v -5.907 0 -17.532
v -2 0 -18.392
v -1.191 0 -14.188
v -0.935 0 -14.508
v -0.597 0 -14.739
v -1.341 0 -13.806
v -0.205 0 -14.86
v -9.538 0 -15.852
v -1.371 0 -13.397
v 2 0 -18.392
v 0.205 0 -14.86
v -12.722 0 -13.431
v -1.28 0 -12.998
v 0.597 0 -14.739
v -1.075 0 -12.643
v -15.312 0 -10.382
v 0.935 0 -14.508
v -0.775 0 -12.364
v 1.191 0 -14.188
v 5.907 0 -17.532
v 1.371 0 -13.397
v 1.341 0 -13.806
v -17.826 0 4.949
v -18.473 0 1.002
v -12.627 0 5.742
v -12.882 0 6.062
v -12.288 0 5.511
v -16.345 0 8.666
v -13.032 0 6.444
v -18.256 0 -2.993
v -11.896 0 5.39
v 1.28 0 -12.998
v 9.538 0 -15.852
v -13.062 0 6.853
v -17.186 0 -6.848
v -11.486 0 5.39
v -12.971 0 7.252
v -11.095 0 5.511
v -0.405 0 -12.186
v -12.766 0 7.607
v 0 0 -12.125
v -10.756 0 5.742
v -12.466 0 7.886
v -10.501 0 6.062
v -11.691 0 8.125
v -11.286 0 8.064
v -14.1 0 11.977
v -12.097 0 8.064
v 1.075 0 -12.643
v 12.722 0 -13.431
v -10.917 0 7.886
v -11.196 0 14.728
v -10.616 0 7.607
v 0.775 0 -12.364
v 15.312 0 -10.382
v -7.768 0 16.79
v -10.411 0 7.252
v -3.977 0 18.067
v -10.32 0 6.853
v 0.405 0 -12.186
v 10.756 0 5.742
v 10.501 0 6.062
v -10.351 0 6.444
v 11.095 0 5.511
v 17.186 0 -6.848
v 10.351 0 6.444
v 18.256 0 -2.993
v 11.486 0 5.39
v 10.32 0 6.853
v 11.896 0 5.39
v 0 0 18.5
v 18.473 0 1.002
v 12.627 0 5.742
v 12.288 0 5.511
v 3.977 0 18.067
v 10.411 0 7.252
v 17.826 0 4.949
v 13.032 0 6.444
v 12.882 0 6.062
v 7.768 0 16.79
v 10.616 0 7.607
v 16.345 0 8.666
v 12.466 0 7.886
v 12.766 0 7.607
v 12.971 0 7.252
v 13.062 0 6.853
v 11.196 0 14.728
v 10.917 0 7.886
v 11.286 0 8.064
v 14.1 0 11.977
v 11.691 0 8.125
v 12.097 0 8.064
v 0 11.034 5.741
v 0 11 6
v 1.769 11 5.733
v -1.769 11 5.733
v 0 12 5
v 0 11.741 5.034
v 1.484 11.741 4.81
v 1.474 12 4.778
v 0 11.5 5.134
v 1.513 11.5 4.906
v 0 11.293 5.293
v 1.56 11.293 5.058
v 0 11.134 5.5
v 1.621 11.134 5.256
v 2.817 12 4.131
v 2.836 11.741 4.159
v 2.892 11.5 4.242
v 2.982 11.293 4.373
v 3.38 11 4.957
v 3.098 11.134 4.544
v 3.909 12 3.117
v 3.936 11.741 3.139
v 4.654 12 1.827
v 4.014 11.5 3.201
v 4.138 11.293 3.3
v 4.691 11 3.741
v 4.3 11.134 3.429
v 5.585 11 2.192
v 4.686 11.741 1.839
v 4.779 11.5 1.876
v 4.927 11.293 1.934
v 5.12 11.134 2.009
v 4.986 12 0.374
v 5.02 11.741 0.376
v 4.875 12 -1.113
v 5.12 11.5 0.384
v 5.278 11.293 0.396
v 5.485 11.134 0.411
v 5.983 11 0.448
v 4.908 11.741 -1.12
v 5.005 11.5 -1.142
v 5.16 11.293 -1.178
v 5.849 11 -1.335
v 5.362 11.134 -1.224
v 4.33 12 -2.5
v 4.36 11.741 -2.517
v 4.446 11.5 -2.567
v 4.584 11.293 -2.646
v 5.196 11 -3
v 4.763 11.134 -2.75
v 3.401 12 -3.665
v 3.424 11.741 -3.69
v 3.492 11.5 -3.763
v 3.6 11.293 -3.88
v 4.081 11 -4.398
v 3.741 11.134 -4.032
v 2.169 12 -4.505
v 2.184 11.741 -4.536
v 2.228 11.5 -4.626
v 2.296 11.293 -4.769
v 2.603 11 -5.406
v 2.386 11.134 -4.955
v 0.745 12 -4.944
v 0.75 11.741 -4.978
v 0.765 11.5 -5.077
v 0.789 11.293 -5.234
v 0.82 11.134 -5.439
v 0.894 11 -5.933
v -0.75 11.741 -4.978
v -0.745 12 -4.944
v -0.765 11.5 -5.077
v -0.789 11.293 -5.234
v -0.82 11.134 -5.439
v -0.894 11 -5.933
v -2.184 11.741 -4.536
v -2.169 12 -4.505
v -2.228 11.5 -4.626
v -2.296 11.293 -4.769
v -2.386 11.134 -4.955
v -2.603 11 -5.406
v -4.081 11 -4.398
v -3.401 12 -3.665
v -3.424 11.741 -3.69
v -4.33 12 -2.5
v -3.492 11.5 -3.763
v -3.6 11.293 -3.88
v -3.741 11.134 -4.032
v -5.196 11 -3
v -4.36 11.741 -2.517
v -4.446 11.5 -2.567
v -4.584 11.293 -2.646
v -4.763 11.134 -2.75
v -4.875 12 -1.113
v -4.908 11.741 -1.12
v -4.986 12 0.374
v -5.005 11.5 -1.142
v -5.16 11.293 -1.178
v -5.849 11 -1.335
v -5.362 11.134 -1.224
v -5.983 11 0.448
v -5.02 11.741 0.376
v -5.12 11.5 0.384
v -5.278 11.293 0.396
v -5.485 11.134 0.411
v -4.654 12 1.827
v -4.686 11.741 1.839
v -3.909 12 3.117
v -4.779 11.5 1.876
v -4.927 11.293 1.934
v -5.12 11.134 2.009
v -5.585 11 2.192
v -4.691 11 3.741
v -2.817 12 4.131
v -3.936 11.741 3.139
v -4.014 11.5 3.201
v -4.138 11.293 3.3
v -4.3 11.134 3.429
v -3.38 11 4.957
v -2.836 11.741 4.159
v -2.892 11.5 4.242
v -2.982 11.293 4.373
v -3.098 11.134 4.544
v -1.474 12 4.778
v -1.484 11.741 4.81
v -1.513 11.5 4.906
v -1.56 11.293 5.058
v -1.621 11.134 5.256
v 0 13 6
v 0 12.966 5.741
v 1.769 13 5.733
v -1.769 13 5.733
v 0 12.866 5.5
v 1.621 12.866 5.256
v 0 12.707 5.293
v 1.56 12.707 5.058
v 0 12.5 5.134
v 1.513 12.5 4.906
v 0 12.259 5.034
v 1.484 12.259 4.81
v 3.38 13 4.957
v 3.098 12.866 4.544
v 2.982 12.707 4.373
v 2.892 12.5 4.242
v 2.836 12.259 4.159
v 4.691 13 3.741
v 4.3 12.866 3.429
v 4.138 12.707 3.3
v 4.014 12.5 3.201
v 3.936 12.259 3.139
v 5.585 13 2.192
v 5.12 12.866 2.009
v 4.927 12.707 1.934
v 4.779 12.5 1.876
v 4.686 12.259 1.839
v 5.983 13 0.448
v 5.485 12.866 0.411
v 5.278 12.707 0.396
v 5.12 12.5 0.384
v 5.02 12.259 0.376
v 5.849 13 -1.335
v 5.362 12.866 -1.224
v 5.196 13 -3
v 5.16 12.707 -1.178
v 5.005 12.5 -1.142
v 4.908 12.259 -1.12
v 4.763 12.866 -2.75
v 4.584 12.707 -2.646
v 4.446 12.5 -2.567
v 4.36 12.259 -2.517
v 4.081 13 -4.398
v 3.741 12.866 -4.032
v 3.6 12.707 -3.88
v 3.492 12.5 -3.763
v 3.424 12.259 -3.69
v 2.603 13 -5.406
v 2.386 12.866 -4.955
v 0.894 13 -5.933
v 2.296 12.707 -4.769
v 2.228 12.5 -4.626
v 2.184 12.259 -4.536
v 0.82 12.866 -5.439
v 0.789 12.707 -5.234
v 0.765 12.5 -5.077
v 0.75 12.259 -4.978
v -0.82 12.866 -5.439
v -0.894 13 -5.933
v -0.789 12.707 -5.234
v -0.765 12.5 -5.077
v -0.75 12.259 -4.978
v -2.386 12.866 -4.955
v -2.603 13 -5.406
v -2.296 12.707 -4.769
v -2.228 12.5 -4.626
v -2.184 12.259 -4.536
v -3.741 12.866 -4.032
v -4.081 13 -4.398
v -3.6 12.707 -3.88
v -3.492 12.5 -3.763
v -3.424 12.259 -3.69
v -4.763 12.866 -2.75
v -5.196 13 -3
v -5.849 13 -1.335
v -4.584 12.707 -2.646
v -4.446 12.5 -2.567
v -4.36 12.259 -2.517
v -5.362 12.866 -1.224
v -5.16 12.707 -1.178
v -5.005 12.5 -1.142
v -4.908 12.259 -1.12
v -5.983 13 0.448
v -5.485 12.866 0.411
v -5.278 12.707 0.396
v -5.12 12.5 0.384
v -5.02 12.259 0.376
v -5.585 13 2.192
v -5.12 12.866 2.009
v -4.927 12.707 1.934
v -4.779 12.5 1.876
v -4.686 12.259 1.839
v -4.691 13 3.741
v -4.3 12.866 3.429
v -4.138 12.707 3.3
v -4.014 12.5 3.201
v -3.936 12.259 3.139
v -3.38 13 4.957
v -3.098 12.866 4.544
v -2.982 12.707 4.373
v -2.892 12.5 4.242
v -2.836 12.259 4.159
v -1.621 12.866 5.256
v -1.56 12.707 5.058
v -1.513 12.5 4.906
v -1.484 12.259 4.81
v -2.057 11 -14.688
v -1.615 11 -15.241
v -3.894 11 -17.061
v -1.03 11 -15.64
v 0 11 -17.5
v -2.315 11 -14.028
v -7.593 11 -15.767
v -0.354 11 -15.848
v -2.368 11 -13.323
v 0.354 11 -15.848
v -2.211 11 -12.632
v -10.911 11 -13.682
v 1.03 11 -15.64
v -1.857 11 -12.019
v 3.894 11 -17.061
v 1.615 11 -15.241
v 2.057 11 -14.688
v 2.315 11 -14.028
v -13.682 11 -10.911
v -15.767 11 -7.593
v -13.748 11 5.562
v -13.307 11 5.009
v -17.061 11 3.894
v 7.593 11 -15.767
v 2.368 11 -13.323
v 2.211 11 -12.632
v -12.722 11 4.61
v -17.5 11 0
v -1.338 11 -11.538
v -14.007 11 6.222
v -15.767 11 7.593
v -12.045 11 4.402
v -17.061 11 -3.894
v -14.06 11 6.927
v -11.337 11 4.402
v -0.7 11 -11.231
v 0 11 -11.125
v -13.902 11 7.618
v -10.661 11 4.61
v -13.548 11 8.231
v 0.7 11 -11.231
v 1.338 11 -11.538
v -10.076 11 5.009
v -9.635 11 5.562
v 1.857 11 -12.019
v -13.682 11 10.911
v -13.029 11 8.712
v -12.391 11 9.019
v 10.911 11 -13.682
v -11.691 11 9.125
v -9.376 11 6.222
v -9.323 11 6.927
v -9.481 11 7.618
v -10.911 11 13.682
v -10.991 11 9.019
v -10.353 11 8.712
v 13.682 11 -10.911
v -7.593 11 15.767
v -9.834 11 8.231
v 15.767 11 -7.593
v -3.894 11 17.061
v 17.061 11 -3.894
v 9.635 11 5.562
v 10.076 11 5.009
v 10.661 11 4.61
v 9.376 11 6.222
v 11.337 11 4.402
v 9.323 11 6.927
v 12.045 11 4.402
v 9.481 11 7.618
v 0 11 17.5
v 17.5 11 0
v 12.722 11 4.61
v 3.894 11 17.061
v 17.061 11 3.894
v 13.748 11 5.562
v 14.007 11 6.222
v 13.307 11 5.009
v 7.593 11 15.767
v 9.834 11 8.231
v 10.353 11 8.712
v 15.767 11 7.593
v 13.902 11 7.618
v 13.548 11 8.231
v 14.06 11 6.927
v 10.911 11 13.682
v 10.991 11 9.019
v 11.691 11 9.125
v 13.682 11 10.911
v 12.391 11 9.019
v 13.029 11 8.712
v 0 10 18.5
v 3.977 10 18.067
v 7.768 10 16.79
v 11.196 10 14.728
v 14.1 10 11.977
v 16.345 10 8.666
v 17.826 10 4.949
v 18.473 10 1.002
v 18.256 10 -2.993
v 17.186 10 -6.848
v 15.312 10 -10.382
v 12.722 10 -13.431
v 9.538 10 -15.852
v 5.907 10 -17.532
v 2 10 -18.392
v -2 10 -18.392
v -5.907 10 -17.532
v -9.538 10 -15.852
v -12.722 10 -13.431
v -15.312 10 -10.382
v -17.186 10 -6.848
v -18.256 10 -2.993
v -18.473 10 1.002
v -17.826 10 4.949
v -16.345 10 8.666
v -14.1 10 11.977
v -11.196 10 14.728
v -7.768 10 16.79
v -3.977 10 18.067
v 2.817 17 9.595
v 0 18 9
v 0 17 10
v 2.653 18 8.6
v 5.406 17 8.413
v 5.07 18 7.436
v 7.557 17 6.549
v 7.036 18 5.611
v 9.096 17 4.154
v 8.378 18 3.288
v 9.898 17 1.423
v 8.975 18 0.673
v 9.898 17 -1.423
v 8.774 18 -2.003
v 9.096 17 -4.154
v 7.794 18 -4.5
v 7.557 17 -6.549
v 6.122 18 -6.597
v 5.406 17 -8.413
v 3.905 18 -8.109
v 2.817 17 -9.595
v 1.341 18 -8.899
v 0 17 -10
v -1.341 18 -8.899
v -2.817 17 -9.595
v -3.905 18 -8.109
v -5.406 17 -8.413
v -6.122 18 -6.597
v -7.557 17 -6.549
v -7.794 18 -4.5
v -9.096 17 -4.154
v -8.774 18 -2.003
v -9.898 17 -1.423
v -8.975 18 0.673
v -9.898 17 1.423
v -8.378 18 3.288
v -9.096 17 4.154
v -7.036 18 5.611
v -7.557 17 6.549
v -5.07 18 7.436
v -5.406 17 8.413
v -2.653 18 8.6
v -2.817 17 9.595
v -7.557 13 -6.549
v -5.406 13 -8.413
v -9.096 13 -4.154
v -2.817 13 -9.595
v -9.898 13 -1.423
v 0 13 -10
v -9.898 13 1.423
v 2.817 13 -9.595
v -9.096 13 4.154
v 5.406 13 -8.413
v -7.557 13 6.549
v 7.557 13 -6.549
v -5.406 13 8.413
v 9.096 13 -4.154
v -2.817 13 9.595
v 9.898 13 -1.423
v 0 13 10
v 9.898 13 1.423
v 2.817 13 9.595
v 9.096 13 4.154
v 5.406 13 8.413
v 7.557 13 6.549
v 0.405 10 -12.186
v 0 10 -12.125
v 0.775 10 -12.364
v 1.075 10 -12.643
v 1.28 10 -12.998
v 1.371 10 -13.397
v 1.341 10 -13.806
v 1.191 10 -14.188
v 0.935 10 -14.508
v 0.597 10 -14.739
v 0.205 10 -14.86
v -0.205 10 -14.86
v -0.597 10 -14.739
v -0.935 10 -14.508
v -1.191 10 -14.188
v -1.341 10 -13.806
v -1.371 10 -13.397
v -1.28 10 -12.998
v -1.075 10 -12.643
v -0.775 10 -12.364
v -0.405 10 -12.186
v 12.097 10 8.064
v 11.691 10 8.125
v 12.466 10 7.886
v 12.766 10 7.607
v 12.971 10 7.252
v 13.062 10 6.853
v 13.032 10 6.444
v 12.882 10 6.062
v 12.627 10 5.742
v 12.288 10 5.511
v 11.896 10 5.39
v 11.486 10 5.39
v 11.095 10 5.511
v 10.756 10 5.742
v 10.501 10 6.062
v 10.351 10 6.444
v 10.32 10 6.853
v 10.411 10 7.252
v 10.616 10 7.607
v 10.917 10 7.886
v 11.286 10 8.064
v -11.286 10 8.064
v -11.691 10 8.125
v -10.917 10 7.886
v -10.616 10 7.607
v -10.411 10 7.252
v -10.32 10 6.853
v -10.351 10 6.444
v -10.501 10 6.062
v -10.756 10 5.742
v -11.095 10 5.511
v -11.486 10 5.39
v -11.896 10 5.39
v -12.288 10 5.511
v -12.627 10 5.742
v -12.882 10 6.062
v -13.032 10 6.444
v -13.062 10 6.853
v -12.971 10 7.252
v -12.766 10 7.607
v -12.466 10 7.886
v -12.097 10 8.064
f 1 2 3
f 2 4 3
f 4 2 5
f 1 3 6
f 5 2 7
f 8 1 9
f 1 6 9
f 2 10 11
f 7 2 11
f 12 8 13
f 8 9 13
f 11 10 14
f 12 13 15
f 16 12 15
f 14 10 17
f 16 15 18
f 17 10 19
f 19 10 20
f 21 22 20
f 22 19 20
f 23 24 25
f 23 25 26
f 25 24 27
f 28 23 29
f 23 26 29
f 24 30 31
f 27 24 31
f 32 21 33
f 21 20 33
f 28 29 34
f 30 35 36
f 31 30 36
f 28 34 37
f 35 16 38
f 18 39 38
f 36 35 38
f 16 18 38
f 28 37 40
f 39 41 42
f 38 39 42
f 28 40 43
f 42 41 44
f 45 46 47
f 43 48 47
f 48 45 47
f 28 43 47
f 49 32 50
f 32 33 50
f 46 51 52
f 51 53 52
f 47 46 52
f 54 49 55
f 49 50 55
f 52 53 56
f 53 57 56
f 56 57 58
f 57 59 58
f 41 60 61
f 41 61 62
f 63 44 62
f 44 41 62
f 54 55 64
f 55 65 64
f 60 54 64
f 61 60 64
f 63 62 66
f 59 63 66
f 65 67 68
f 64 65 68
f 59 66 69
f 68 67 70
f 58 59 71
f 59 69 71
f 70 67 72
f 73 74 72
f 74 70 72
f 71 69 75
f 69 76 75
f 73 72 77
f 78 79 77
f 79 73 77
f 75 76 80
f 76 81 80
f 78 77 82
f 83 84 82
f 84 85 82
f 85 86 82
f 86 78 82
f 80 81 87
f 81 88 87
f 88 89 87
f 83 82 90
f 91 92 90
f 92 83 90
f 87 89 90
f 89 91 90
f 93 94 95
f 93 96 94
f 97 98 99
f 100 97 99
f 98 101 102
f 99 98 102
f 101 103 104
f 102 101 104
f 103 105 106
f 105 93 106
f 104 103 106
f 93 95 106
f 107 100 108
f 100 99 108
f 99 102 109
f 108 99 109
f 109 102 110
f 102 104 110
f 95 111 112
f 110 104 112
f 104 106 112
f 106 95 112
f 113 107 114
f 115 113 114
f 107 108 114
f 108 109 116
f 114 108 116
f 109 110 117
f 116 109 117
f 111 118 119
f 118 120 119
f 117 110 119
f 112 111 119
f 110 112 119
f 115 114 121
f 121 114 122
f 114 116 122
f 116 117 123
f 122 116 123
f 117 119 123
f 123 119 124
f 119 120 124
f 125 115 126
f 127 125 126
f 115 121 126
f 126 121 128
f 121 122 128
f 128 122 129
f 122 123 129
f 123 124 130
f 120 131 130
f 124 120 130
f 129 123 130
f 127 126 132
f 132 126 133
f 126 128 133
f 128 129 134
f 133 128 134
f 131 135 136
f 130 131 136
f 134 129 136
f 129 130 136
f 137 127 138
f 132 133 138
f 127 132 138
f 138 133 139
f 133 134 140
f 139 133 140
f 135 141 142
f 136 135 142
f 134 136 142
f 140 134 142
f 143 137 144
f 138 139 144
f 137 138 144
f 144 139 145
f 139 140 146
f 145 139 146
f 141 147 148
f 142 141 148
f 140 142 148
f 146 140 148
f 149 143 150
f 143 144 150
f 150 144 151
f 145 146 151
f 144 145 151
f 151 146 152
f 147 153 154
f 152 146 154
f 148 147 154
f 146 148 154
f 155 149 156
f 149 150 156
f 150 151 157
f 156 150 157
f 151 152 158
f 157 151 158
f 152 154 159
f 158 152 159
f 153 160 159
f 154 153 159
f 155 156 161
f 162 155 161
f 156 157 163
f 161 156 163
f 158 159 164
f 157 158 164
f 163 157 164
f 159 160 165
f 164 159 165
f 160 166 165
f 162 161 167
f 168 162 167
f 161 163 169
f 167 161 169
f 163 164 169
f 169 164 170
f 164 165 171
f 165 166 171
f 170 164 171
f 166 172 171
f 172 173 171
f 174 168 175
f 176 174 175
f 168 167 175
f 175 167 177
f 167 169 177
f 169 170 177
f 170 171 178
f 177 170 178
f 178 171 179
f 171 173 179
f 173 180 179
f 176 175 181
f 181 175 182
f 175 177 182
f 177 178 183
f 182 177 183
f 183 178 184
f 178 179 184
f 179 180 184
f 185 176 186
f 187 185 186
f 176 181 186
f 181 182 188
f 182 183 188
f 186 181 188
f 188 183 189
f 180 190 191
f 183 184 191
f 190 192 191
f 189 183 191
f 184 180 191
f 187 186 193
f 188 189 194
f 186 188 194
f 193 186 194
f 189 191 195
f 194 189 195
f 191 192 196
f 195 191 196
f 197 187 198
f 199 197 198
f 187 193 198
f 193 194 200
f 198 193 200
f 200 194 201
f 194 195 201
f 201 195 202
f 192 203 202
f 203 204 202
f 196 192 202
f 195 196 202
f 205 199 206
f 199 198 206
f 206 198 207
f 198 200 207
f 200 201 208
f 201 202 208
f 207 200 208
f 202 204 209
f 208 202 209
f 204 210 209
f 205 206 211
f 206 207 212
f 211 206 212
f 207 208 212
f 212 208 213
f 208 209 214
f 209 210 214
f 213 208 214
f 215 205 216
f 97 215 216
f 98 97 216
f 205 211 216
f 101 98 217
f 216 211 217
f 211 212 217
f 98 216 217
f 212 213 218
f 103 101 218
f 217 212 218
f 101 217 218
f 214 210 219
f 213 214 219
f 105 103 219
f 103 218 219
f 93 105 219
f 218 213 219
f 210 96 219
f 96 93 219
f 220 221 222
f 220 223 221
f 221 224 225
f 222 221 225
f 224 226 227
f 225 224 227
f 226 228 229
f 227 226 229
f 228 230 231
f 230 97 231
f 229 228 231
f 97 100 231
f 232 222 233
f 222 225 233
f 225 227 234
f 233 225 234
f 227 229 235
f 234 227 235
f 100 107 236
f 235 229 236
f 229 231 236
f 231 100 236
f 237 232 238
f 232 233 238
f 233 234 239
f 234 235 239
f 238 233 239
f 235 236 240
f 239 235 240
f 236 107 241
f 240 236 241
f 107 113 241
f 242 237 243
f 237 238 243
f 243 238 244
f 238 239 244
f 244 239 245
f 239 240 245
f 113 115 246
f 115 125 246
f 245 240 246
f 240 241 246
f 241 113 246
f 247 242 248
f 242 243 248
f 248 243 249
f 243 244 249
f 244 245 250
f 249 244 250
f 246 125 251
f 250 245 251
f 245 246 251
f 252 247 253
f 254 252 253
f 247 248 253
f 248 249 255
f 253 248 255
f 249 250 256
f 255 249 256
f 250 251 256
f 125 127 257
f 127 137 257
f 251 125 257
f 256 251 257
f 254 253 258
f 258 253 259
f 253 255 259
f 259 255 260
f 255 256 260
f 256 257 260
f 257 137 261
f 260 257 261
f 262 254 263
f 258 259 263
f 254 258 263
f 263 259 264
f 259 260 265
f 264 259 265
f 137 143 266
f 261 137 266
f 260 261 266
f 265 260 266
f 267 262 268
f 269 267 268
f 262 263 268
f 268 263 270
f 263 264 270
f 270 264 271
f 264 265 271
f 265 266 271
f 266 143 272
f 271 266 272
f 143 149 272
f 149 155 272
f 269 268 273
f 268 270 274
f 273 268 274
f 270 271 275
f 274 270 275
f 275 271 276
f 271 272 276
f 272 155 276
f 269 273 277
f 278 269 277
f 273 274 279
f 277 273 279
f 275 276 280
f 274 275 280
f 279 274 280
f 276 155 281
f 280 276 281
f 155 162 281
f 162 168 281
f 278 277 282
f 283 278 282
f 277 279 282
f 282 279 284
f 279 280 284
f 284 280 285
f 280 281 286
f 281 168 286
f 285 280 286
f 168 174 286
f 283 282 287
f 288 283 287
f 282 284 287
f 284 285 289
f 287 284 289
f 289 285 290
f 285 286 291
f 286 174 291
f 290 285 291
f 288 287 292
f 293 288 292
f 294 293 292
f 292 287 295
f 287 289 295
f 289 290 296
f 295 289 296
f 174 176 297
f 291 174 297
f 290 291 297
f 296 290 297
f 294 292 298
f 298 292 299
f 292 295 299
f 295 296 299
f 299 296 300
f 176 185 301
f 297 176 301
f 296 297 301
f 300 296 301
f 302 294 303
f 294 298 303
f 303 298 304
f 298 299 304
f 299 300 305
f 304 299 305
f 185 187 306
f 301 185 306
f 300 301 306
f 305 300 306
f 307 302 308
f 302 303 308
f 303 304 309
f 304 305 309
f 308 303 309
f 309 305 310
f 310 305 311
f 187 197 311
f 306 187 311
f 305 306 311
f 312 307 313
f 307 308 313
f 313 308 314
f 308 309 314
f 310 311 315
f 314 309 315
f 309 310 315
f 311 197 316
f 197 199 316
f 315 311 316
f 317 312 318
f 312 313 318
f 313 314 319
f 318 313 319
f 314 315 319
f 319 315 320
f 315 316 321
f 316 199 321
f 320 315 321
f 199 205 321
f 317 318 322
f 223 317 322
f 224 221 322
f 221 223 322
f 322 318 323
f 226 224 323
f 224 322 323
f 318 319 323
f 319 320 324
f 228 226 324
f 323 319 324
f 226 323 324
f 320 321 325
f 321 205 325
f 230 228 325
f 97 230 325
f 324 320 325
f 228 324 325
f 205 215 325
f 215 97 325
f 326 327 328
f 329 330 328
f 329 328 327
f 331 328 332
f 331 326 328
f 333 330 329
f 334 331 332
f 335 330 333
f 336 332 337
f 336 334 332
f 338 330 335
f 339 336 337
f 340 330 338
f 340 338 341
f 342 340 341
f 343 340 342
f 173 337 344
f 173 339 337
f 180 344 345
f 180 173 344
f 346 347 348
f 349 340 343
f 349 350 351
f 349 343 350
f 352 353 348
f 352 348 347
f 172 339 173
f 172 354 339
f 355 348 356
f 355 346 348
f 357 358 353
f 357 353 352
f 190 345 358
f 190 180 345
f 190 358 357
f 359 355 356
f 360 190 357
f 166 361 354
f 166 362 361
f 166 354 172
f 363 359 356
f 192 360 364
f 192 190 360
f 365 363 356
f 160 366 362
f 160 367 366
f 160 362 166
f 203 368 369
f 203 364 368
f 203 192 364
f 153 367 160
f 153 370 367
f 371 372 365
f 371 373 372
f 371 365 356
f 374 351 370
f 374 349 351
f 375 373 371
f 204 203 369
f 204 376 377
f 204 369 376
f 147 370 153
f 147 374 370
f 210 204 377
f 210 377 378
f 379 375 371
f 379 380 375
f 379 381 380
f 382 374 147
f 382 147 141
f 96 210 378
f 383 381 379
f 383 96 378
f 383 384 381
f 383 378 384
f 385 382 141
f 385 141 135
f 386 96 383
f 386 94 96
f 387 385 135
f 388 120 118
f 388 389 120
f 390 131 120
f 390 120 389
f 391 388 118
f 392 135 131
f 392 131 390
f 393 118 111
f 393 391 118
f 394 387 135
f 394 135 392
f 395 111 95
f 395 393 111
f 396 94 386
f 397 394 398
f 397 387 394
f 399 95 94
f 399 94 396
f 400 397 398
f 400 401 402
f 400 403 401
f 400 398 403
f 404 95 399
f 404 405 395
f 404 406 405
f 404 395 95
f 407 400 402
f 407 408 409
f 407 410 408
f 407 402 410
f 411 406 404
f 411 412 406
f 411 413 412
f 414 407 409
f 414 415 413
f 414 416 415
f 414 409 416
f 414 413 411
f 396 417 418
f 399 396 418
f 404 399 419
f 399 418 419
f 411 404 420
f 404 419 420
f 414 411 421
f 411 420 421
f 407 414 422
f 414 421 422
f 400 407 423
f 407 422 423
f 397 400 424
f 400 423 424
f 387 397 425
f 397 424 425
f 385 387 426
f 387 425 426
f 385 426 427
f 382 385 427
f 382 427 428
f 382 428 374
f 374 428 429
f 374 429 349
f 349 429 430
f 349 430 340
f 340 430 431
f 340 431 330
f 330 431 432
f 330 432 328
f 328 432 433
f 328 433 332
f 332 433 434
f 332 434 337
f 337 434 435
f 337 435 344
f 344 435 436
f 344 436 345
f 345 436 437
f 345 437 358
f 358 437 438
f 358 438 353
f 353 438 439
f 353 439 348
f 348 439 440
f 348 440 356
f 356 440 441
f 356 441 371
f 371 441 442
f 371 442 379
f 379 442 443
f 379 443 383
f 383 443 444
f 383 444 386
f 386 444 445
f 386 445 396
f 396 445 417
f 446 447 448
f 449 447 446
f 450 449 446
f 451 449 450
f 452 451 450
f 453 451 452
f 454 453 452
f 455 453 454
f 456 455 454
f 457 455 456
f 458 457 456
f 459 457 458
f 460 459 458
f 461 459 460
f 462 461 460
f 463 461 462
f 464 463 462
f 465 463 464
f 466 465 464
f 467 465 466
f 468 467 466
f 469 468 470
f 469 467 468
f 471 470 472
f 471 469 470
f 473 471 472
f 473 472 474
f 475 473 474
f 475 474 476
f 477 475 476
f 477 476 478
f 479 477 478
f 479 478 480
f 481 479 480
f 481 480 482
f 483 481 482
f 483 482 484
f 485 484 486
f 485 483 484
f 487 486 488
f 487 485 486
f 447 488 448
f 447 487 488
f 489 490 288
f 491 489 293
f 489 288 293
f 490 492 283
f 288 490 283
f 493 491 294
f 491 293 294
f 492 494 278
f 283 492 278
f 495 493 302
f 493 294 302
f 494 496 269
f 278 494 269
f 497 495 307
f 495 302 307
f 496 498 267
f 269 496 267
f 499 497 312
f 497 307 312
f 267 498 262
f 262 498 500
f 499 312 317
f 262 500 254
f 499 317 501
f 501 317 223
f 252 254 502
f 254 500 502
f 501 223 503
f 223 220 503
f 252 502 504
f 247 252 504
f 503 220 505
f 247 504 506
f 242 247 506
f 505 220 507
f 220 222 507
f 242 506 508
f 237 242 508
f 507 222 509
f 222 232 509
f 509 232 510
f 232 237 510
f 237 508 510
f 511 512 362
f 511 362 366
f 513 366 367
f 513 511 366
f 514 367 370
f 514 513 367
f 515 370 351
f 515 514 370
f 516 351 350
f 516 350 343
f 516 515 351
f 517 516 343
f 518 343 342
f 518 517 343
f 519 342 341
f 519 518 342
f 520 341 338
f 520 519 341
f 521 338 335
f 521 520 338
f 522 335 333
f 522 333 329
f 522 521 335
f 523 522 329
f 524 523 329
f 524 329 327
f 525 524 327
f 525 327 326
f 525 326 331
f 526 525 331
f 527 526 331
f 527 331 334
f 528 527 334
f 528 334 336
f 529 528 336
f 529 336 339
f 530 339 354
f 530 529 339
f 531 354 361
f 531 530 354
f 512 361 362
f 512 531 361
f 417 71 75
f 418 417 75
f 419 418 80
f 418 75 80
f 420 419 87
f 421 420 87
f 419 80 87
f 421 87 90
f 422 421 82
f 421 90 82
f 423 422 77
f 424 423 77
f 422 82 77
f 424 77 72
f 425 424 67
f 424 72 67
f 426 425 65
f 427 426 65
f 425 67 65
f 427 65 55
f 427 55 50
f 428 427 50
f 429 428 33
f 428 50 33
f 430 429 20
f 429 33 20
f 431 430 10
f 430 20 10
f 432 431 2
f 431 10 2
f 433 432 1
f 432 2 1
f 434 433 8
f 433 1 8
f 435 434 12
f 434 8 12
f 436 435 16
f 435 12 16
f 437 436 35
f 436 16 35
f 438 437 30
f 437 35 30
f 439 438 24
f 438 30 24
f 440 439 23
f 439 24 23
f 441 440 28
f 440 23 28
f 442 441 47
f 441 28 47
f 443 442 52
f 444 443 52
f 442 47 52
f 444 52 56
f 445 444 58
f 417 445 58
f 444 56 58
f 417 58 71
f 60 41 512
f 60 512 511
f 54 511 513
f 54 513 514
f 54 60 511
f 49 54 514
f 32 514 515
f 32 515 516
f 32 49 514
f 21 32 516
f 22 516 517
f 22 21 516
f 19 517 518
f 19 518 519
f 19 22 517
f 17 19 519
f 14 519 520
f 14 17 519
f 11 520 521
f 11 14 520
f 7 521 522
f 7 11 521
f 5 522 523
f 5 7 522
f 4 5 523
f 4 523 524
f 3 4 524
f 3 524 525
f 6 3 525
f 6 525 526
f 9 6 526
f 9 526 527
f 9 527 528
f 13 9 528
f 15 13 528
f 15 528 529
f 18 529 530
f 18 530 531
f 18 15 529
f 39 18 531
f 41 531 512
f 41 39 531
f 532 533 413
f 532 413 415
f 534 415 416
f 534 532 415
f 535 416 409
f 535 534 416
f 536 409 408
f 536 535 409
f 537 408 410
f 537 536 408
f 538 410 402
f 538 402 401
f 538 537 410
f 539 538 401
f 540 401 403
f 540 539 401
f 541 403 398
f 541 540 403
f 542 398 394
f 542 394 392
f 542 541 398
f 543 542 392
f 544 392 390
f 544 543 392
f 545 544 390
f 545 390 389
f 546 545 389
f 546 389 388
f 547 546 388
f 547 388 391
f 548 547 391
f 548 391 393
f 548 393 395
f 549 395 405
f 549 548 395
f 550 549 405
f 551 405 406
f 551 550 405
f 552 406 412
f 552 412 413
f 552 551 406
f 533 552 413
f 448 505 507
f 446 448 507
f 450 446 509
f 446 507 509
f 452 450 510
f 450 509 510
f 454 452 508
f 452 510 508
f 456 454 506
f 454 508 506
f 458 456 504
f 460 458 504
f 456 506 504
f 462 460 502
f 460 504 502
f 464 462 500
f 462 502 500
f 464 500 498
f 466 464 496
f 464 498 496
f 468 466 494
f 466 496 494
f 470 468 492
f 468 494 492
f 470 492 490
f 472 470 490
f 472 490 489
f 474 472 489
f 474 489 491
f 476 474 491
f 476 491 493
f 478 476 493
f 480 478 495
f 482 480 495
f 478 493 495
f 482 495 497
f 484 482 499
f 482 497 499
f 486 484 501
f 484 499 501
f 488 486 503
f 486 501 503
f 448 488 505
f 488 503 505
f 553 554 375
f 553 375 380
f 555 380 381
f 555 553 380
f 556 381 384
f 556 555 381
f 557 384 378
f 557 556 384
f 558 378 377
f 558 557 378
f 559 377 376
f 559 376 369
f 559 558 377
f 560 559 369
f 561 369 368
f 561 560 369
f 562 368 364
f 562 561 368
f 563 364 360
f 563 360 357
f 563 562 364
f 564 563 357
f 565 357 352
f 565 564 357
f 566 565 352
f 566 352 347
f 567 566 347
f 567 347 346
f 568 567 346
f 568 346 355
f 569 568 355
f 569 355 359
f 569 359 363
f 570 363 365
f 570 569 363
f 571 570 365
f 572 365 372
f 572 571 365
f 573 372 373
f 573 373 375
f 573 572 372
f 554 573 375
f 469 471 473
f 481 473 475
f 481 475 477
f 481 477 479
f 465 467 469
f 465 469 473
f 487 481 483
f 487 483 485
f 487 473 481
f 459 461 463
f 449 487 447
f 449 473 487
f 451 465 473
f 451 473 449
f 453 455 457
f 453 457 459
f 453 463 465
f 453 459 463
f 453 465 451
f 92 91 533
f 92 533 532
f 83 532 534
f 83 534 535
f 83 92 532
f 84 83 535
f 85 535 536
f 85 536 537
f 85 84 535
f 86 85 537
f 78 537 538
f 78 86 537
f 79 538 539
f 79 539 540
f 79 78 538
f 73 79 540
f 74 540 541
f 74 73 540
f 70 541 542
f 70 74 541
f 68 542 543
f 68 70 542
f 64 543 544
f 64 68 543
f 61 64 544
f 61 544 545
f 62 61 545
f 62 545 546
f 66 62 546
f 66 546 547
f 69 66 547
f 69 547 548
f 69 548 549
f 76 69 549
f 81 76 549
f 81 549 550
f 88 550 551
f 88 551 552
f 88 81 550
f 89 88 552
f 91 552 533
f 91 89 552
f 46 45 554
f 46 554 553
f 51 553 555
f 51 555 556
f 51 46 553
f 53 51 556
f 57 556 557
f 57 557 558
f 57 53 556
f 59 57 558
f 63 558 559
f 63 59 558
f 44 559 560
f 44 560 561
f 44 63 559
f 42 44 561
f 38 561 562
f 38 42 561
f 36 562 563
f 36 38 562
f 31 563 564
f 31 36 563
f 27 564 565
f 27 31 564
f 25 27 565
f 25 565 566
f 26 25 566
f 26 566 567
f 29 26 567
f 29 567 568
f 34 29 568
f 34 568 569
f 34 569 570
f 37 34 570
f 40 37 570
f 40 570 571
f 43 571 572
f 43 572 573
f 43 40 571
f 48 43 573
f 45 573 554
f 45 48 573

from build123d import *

# Parameters (mm, degrees)
SKETCH2_R           = 18.5
SKETCH2_R_2         = 1.375
BOSS_EXTRUDE1_DEPTH = 11
SKETCH4_R           = 5
BOSS_EXTRUDE3_DEPTH = 2
SKETCH5_R           = 10
BOSS_EXTRUDE4_DEPTH = 5
FILLET1_R           = 1
CHAMFER3_SIZE       = 1
CHAMFER4_SIZE       = 1


with BuildPart() as part:
    # Sketch2 → Boss-Extrude1 (new body)
    with BuildSketch(Plane(origin=(0, 0, 0), x_dir=(1, 0, 0), z_dir=(0, 1, 0))):
        with Locations(Location((0, 0, 0), (0, 0, 270))):
            Circle(SKETCH2_R)
        with Locations(Location((0, 13.5, 0), (0, 0, 270))):
            Circle(SKETCH2_R_2, mode=Mode.SUBTRACT)
        with Locations(Location((-11.691342951, -6.75, 0), (0, 0, 270))):
            Circle(SKETCH2_R_2, mode=Mode.SUBTRACT)
        with Locations(Location((11.691342951, -6.75, 0), (0, 0, 270))):
            Circle(SKETCH2_R_2, mode=Mode.SUBTRACT)
    extrude(amount=BOSS_EXTRUDE1_DEPTH)

    # Sketch4 → Boss-Extrude3 (add)
    with BuildSketch(Plane(origin=(0, 11, 0), x_dir=(1, 0, 0), z_dir=(0, 1, 0))):
        with Locations(Location((0, 0, 0), (0, 0, 270))):
            Circle(SKETCH4_R)
    extrude(amount=BOSS_EXTRUDE3_DEPTH)

    # Sketch5 → Boss-Extrude4 (add)
    with BuildSketch(Plane(origin=(0, 13, 0), x_dir=(1, 0, 0), z_dir=(0, 1, 0))):
        with Locations(Location((0, 0, 0), (0, 0, 270))):
            Circle(SKETCH5_R)
    extrude(amount=BOSS_EXTRUDE4_DEPTH)

    # Fillet1
    fillet1_edges = [part.edges().sort_by_distance(p)[0] for p in [
        (0, 11, -5),
        (0, 13, -5),
    ]]
    fillet(fillet1_edges, radius=FILLET1_R - 0.0001)  # a hair under: the kernel refuses the full size

    # Chamfer3
    chamfer3_edges = [part.edges().sort_by_distance(p)[0] for p in [
        (11.691342951, 11, 5.375),
        (0, 11, -14.875),
        (-11.691342951, 11, 5.375),
    ]]
    chamfer(chamfer3_edges, length=CHAMFER3_SIZE)

    # Chamfer4
    chamfer4_edges = [part.edges().sort_by_distance(p)[0] for p in [
        (0, 18, -10),
        (0, 11, -18.5),
    ]]
    chamfer(chamfer4_edges, length=CHAMFER4_SIZE)


solid = part.part
